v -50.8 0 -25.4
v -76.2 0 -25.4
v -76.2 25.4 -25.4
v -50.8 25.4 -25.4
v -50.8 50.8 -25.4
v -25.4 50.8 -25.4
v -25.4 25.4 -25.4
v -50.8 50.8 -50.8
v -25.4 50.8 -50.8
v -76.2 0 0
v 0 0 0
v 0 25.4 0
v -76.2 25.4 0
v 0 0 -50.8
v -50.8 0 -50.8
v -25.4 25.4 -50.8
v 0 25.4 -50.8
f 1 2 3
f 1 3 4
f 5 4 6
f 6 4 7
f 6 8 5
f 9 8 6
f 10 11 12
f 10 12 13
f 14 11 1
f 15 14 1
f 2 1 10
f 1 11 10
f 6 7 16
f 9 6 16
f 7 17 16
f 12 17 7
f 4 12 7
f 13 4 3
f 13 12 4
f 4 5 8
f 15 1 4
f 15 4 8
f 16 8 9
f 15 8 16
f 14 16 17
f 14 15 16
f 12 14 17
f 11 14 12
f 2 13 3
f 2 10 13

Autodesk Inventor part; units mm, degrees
ref_plane "YZ Plane" through (0, 0, 0) normal (1, 0, 0) x (0, 1, 0)
ref_plane "XZ Plane" through (0, 0, 0) normal (0, 1, 0) x (-1, 0, 0)
ref_plane "XY Plane" through (0, 0, 0) normal (0, 0, 1) x (1, 0, 0)
sketch "Sketch1" plane through (0, 0, 0) normal (0, 1, 0) x (-1, 0, 0)
  line L0 (0, 0) -> (76.2, 0)
  line L1 (76.2, 0) -> (76.2, -25.4)
  line L2 (76.2, -25.4) -> (50.8, -25.4)
  line L3 (50.8, -25.4) -> (50.8, -50.8)
  line L4 (50.8, -50.8) -> (0, -50.8)
  line L5 (0, -50.8) -> (0, 0)
  dimension "d0" = 76.2
  dimension "d1" = 25.4
  dimension "d2" = 25.4
  dimension "d3" = 25.4
  dimension "d4" = 50.8
extrude "Extrusion1" add sketch "Sketch1" along normal blind 25.4
sketch "Sketch2" plane through (0, 25.4, 0) normal (0, 1, 0) x (1, 0, 0)
  line L0 (-50.8, 25.4) -> (-25.4, 25.4)
  line L1 (-25.4, 25.4) -> (-25.4, 50.8)
  line L2 (-25.4, 50.8) -> (-50.8, 50.8)
  line L3 (-50.8, 50.8) -> (-50.8, 25.4)
  line L4 (-50.8, 50.8) -> (-50.8, 25.4) projected
  point P0 (0, 0)
  dimension "d7" = 25.4
extrude "Extrusion2" add sketch "Sketch2" along normal blind 25.4
properties part number "BluePuzzlePiece"
